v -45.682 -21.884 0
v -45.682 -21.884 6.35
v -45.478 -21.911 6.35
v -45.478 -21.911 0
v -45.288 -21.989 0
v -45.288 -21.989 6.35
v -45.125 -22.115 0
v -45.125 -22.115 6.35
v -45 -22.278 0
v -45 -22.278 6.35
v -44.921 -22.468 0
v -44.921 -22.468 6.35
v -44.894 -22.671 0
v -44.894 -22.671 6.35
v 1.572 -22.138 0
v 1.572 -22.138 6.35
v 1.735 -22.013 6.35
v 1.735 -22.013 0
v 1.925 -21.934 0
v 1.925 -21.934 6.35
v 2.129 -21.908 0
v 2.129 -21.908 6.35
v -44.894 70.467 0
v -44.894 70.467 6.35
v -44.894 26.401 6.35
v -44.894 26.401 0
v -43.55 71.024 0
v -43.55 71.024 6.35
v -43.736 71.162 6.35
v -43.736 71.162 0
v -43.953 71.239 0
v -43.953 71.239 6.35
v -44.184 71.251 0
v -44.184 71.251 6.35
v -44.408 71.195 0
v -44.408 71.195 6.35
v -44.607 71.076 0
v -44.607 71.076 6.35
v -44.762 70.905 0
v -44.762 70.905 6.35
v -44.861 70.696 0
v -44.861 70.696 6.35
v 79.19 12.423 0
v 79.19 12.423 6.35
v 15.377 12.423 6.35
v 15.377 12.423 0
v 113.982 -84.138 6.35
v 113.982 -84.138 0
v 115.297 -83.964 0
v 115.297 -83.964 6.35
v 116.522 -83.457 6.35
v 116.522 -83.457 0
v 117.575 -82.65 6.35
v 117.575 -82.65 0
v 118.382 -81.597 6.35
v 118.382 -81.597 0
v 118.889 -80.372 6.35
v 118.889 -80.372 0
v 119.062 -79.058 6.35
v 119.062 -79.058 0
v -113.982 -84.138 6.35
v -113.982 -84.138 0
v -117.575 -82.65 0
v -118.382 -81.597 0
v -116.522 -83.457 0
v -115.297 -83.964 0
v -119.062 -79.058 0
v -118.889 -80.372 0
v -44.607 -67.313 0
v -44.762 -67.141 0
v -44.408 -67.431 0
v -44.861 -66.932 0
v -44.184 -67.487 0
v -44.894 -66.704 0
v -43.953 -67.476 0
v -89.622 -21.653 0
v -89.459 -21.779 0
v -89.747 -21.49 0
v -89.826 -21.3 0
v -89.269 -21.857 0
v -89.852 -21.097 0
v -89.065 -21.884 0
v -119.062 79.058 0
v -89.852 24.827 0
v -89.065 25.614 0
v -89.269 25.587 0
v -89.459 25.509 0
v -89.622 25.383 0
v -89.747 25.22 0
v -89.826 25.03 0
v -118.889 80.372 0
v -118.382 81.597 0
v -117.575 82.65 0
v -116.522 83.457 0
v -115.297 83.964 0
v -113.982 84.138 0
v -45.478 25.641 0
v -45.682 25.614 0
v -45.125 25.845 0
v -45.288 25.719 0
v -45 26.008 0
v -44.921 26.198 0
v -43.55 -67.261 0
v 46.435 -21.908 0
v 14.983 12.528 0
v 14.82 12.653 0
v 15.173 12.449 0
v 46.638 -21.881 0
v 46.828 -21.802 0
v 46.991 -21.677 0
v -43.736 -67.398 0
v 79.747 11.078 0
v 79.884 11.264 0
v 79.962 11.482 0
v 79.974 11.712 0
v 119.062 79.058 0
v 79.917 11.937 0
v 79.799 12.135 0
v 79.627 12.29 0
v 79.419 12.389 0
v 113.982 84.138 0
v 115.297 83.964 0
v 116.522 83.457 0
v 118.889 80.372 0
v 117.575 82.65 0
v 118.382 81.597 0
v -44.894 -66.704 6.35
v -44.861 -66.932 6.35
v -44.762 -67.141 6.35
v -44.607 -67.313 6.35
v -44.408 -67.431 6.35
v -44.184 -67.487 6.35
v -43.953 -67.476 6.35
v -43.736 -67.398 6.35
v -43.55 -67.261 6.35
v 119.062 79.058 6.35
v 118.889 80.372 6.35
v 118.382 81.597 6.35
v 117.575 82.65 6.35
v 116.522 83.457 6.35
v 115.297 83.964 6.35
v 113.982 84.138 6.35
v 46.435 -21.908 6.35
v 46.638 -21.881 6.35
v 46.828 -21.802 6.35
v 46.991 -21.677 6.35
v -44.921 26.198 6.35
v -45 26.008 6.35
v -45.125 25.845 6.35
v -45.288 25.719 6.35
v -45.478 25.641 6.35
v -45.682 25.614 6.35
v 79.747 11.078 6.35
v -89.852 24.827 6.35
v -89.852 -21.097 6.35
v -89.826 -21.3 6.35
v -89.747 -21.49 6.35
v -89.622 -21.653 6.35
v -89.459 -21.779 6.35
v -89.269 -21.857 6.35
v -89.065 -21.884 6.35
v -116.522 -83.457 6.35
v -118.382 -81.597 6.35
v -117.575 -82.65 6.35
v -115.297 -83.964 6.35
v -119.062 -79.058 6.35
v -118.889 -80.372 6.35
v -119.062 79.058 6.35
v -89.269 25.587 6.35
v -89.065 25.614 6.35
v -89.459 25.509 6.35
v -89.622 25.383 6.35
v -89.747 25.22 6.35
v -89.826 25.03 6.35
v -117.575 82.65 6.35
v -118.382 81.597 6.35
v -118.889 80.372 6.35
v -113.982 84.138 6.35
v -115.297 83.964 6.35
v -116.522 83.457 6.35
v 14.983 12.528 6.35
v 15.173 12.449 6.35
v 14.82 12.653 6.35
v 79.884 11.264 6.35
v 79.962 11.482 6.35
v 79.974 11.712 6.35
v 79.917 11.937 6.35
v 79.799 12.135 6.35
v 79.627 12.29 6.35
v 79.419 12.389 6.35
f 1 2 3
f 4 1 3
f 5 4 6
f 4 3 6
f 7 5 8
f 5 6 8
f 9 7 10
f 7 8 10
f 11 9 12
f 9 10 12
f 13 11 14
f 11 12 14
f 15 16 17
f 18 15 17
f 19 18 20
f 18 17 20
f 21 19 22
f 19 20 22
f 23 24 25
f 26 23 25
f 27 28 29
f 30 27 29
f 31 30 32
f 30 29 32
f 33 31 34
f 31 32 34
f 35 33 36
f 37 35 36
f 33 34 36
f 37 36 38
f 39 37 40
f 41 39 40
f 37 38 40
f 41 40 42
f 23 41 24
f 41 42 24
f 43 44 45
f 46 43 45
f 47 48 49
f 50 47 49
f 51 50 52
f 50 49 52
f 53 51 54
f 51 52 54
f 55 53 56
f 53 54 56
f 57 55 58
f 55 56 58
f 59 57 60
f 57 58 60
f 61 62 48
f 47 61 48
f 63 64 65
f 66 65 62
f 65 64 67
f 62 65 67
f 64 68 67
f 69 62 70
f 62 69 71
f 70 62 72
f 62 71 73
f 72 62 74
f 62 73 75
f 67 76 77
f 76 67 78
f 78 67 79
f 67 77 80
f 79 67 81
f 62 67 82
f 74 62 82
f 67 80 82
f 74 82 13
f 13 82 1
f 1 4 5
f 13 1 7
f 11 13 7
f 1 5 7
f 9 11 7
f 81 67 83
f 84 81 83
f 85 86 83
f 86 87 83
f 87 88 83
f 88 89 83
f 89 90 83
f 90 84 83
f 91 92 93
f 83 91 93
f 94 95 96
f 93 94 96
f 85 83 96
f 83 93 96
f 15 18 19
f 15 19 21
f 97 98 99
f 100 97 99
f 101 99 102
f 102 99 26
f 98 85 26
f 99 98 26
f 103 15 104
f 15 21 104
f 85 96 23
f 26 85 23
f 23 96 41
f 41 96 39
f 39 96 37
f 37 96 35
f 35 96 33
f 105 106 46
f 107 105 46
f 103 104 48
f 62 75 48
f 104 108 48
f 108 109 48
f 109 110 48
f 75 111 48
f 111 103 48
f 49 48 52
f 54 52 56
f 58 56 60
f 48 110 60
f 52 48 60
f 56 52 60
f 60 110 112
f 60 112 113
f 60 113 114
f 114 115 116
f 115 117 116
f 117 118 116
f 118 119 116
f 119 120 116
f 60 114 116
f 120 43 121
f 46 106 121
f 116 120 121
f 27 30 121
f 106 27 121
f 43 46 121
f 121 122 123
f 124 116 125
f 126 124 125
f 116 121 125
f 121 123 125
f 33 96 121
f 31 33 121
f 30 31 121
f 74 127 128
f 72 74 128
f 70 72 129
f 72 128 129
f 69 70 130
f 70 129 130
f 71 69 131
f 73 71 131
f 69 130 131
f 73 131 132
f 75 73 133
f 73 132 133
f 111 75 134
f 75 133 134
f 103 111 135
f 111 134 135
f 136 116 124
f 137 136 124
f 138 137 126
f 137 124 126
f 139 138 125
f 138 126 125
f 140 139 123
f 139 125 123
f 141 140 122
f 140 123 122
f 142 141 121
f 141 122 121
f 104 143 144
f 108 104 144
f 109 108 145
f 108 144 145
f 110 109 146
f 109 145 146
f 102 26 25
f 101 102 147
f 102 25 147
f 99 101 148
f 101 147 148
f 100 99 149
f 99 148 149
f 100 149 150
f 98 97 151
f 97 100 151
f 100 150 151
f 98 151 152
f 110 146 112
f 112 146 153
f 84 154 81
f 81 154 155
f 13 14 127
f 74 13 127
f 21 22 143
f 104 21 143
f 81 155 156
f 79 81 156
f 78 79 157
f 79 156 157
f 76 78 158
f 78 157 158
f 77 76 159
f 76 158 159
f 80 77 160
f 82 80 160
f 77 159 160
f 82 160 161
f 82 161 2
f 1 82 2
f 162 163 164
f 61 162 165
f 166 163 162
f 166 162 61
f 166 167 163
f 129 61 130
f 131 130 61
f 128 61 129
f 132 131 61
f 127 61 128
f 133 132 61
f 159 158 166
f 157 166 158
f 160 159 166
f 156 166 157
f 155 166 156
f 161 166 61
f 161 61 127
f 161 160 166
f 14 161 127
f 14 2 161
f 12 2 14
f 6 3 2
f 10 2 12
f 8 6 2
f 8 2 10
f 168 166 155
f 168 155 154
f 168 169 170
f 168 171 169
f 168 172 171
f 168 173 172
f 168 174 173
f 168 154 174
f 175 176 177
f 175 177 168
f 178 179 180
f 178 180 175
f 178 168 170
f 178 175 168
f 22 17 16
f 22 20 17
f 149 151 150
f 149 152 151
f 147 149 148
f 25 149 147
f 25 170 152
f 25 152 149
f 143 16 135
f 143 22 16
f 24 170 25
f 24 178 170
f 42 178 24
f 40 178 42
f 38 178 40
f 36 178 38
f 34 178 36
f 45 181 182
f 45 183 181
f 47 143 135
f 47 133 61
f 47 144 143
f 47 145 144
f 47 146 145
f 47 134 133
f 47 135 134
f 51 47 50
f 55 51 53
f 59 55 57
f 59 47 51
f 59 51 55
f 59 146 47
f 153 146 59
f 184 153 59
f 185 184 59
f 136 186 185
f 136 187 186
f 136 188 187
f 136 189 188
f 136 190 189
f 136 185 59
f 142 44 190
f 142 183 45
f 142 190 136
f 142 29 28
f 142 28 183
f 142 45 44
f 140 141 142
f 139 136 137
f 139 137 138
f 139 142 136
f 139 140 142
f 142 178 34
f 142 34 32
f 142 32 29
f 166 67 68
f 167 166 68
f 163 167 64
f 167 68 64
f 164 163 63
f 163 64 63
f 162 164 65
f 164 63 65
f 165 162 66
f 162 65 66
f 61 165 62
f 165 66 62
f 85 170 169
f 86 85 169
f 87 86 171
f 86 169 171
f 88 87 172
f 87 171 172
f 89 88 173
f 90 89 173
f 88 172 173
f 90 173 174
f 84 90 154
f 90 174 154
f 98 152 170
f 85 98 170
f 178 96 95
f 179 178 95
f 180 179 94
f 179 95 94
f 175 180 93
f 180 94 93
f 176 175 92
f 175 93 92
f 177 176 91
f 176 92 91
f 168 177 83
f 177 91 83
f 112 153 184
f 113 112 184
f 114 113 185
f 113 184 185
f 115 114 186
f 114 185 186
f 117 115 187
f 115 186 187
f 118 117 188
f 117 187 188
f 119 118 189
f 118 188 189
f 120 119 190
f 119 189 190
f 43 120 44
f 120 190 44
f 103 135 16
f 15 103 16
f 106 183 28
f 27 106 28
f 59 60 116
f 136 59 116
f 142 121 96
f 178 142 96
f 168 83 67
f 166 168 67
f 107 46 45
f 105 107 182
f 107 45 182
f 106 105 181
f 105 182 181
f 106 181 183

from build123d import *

# Parameters (mm, degrees)
F1_DEPTH = 6.35
F3_DEPTH = 6.351
F5_DEPTH = 6.351


with BuildPart() as f1:
    # F0 (on Top) → F1 (new body)
    with BuildSketch(Plane.XY):
        with BuildLine():
            Line((113.9825, 84.1375), (-113.9825, 84.1375))
            ThreePointArc((-113.9825, 84.1375), (-117.574602, 82.649602), (-119.0625, 79.0575))
            Line((-119.0625, 79.0575), (-119.0625, -79.0575))
            ThreePointArc((-119.0625, -79.0575), (-117.574602, -82.649602), (-113.9825, -84.1375))
            Line((-113.9825, -84.1375), (113.9825, -84.1375))
            ThreePointArc((113.9825, -84.1375), (117.574602, -82.649602), (119.0625, -79.0575))
            Line((119.0625, -79.0575), (119.0625, 79.0575))
            ThreePointArc((119.0625, 79.0575), (117.574602, 82.649602), (113.9825, 84.1375))
        make_face()
    extrude(amount=F1_DEPTH)

    # F2 (on face) → F3 (cut, through all)
    with BuildSketch(Plane.XY.offset(6.35)):
        Polygon((-88.5825, 24.343994), (-88.5825, -20.614006), (-43.6245, -20.614006), (-43.6245, -65.538781), (1.276781, -20.6375), (46.234781, -20.6375), (78.024887, 11.152607), (14.524887, 11.152607), (-43.6245, 69.301994), (-43.6245, 24.343994), align=None)
    extrude(amount=-F3_DEPTH, mode=Mode.SUBTRACT)

    # F4 (on face) → F5 (cut, through all)
    with BuildSketch(Plane.XY.offset(6.35)):
        with BuildLine():
            ThreePointArc((79.746763, 11.078431), (79.917449, 11.936532), (79.189987, 12.422607))
            Line((79.189987, 12.422607), (15.37709, 12.422607))
            ThreePointArc((15.37709, 12.422607), (15.075765, 12.482544), (14.820314, 12.653231))
            Line((14.820314, 12.653231), (-43.550324, 71.023869))
            ThreePointArc((-43.550324, 71.023869), (-44.408425, 71.194556), (-44.8945, 70.467093))
            Line((-44.8945, 70.467093), (-44.8945, 26.401394))
            ThreePointArc((-44.8945, 26.401394), (-45.125124, 25.844618), (-45.6819, 25.613994))
            Line((-45.6819, 25.613994), (-89.0651, 25.613994))
            ThreePointArc((-89.0651, 25.613994), (-89.621876, 25.38337), (-89.8525, 24.826594))
            Line((-89.8525, 24.826594), (-89.8525, -21.096606))
            ThreePointArc((-89.8525, -21.096606), (-89.621876, -21.653382), (-89.0651, -21.884006))
            Line((-89.0651, -21.884006), (-45.6819, -21.884006))
            ThreePointArc((-45.6819, -21.884006), (-45.125124, -22.11463), (-44.8945, -22.671406))
            Line((-44.8945, -22.671406), (-44.8945, -66.70388))
            ThreePointArc((-44.8945, -66.70388), (-44.408425, -67.431343), (-43.550324, -67.260656))
            Line((-43.550324, -67.260656), (1.572208, -22.138124))
            ThreePointArc((1.572208, -22.138124), (1.827659, -21.967437), (2.128984, -21.9075))
            Line((2.128984, -21.9075), (46.43468, -21.9075))
            ThreePointArc((46.43468, -21.9075), (46.736005, -21.847563), (46.991456, -21.676876))
            Line((46.991456, -21.676876), (79.746763, 11.078431))
        make_face()
    extrude(amount=-F5_DEPTH, mode=Mode.SUBTRACT)


solid = f1.part
